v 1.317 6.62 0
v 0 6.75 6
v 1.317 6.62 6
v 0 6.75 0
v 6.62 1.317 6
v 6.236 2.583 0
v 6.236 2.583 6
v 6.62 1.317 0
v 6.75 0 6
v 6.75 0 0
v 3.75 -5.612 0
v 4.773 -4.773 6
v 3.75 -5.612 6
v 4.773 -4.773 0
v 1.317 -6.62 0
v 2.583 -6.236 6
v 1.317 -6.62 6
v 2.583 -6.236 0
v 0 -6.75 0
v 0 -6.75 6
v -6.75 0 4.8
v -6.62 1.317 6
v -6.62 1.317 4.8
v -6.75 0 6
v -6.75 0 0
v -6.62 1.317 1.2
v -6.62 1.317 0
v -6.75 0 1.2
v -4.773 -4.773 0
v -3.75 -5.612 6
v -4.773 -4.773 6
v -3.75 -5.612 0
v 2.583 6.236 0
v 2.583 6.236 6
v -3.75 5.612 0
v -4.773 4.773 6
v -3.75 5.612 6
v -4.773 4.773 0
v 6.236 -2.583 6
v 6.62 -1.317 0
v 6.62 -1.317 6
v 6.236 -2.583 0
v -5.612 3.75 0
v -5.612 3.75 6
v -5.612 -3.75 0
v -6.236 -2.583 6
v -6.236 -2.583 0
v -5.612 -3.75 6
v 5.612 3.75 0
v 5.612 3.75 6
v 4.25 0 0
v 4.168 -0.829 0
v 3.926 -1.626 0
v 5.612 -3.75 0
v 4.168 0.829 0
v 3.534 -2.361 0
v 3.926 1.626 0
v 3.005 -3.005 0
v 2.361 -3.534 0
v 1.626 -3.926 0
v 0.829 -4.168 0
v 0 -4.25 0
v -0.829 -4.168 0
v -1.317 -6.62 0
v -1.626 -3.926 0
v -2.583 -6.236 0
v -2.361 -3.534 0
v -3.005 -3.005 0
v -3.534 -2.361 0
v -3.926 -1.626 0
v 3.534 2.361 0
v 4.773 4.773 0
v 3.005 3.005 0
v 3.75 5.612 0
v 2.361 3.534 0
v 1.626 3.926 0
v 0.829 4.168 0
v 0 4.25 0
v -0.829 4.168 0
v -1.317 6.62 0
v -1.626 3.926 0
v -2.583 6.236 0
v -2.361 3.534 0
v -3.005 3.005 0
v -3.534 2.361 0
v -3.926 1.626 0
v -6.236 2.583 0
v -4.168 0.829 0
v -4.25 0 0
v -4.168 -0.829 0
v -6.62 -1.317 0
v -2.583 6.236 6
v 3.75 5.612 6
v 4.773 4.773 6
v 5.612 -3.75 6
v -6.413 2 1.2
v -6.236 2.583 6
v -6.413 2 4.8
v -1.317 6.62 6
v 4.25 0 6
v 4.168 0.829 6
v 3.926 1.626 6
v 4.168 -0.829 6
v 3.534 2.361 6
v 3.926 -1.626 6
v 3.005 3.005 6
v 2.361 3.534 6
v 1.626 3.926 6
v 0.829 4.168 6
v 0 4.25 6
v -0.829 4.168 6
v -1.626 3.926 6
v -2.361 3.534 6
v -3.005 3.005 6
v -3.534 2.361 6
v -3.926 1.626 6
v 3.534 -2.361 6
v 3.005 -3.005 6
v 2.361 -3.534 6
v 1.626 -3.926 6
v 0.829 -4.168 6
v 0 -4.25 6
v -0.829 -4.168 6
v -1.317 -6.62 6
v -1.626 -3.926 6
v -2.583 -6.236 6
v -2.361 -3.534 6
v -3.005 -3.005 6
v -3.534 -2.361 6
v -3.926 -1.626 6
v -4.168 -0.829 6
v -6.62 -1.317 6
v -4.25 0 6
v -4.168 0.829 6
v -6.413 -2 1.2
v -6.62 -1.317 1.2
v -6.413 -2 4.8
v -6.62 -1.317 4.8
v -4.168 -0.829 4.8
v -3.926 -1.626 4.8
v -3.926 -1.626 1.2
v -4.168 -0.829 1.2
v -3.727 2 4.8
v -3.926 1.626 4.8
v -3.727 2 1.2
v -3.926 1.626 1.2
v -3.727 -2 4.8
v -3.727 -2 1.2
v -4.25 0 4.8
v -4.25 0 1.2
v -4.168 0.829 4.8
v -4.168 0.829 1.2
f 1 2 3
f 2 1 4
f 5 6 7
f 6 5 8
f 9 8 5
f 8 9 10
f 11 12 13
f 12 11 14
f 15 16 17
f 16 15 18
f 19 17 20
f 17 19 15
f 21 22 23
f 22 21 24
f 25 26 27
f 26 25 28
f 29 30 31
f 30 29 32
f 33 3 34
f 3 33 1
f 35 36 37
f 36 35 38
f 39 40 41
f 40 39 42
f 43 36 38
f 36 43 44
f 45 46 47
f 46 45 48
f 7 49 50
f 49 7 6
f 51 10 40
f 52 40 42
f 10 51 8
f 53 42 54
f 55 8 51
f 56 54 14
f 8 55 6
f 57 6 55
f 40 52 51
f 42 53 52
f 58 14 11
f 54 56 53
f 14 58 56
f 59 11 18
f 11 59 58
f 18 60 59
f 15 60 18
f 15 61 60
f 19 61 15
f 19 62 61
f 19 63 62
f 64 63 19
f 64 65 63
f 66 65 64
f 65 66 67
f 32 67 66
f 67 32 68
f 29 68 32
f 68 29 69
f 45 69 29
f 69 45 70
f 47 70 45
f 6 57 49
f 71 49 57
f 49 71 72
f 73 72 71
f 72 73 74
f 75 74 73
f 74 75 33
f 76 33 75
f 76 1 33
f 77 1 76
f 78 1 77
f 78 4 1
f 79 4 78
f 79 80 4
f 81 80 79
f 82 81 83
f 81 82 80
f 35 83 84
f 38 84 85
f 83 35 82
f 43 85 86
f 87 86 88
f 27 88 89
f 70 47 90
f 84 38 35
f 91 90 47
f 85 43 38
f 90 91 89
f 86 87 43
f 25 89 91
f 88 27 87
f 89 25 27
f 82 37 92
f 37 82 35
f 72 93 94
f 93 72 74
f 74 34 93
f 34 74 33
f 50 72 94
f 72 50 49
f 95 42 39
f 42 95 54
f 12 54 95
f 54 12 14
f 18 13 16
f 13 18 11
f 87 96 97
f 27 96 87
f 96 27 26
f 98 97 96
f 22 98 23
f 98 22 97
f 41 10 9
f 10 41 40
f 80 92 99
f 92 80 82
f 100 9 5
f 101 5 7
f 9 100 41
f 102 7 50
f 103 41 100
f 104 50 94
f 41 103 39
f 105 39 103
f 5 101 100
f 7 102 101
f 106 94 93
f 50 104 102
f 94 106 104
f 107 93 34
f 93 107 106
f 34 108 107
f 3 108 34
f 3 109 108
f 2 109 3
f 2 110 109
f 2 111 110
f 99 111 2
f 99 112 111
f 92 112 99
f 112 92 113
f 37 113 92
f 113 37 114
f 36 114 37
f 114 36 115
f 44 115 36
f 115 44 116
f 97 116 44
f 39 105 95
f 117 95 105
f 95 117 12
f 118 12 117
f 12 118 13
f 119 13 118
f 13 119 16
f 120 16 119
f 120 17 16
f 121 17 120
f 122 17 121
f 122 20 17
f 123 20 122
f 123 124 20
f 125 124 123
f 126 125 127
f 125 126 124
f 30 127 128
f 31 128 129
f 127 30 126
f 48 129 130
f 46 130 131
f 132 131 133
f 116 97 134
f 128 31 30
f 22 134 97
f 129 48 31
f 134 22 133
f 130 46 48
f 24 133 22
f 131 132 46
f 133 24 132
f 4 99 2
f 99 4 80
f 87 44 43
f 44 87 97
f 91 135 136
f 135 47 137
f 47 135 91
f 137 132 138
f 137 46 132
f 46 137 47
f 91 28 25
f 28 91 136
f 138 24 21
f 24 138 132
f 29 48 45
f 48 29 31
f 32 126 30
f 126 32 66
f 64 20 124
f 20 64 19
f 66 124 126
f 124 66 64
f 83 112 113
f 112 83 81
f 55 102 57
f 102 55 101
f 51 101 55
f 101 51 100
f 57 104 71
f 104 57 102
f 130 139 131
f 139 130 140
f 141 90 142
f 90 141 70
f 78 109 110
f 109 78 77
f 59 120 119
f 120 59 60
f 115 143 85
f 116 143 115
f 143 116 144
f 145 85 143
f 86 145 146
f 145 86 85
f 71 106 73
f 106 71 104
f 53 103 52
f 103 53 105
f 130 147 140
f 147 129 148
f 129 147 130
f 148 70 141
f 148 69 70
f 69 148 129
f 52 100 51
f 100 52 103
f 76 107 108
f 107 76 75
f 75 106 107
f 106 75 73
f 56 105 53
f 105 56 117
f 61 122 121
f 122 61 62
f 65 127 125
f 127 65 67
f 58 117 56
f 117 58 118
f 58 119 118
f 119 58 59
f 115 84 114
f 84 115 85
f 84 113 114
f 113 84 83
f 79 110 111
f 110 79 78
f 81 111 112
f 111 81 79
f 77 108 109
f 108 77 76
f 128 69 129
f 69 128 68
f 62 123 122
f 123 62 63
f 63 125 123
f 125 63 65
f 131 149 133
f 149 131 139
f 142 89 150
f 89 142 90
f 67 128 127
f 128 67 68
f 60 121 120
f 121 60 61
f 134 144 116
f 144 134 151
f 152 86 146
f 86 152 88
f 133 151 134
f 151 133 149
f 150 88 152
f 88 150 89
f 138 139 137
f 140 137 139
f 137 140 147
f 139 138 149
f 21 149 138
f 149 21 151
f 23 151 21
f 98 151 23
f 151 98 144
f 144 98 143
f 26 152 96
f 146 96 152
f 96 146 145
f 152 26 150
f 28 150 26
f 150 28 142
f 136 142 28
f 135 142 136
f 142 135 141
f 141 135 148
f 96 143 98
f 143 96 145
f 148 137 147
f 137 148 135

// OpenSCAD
$fn = 32;

// ----------------------------------------------------------------------
// Spacer sleeve: 13.5 / 8.5 x 6 mm
// ----------------------------------------------------------------------

// --- parameters (mm) ---
outer_d = 13.5;           // outside diameter
inner_d = 8.5;            // shaft bore
length = 6;               // sleeve length
slot_w = 4;               // clamp slot width
slot_len = 3.6;           // clamp slot length

module sleeve() {
  cylinder(h = length, d = outer_d);
}

difference() {
  sleeve();
  translate([0, 0, -1]) cylinder(h = length + 2, d = inner_d);
  translate([-outer_d / 2 - 1, -slot_w / 2, length / 2 - slot_len / 2]) cube([outer_d / 2 + 1, slot_w, slot_len]);
}
